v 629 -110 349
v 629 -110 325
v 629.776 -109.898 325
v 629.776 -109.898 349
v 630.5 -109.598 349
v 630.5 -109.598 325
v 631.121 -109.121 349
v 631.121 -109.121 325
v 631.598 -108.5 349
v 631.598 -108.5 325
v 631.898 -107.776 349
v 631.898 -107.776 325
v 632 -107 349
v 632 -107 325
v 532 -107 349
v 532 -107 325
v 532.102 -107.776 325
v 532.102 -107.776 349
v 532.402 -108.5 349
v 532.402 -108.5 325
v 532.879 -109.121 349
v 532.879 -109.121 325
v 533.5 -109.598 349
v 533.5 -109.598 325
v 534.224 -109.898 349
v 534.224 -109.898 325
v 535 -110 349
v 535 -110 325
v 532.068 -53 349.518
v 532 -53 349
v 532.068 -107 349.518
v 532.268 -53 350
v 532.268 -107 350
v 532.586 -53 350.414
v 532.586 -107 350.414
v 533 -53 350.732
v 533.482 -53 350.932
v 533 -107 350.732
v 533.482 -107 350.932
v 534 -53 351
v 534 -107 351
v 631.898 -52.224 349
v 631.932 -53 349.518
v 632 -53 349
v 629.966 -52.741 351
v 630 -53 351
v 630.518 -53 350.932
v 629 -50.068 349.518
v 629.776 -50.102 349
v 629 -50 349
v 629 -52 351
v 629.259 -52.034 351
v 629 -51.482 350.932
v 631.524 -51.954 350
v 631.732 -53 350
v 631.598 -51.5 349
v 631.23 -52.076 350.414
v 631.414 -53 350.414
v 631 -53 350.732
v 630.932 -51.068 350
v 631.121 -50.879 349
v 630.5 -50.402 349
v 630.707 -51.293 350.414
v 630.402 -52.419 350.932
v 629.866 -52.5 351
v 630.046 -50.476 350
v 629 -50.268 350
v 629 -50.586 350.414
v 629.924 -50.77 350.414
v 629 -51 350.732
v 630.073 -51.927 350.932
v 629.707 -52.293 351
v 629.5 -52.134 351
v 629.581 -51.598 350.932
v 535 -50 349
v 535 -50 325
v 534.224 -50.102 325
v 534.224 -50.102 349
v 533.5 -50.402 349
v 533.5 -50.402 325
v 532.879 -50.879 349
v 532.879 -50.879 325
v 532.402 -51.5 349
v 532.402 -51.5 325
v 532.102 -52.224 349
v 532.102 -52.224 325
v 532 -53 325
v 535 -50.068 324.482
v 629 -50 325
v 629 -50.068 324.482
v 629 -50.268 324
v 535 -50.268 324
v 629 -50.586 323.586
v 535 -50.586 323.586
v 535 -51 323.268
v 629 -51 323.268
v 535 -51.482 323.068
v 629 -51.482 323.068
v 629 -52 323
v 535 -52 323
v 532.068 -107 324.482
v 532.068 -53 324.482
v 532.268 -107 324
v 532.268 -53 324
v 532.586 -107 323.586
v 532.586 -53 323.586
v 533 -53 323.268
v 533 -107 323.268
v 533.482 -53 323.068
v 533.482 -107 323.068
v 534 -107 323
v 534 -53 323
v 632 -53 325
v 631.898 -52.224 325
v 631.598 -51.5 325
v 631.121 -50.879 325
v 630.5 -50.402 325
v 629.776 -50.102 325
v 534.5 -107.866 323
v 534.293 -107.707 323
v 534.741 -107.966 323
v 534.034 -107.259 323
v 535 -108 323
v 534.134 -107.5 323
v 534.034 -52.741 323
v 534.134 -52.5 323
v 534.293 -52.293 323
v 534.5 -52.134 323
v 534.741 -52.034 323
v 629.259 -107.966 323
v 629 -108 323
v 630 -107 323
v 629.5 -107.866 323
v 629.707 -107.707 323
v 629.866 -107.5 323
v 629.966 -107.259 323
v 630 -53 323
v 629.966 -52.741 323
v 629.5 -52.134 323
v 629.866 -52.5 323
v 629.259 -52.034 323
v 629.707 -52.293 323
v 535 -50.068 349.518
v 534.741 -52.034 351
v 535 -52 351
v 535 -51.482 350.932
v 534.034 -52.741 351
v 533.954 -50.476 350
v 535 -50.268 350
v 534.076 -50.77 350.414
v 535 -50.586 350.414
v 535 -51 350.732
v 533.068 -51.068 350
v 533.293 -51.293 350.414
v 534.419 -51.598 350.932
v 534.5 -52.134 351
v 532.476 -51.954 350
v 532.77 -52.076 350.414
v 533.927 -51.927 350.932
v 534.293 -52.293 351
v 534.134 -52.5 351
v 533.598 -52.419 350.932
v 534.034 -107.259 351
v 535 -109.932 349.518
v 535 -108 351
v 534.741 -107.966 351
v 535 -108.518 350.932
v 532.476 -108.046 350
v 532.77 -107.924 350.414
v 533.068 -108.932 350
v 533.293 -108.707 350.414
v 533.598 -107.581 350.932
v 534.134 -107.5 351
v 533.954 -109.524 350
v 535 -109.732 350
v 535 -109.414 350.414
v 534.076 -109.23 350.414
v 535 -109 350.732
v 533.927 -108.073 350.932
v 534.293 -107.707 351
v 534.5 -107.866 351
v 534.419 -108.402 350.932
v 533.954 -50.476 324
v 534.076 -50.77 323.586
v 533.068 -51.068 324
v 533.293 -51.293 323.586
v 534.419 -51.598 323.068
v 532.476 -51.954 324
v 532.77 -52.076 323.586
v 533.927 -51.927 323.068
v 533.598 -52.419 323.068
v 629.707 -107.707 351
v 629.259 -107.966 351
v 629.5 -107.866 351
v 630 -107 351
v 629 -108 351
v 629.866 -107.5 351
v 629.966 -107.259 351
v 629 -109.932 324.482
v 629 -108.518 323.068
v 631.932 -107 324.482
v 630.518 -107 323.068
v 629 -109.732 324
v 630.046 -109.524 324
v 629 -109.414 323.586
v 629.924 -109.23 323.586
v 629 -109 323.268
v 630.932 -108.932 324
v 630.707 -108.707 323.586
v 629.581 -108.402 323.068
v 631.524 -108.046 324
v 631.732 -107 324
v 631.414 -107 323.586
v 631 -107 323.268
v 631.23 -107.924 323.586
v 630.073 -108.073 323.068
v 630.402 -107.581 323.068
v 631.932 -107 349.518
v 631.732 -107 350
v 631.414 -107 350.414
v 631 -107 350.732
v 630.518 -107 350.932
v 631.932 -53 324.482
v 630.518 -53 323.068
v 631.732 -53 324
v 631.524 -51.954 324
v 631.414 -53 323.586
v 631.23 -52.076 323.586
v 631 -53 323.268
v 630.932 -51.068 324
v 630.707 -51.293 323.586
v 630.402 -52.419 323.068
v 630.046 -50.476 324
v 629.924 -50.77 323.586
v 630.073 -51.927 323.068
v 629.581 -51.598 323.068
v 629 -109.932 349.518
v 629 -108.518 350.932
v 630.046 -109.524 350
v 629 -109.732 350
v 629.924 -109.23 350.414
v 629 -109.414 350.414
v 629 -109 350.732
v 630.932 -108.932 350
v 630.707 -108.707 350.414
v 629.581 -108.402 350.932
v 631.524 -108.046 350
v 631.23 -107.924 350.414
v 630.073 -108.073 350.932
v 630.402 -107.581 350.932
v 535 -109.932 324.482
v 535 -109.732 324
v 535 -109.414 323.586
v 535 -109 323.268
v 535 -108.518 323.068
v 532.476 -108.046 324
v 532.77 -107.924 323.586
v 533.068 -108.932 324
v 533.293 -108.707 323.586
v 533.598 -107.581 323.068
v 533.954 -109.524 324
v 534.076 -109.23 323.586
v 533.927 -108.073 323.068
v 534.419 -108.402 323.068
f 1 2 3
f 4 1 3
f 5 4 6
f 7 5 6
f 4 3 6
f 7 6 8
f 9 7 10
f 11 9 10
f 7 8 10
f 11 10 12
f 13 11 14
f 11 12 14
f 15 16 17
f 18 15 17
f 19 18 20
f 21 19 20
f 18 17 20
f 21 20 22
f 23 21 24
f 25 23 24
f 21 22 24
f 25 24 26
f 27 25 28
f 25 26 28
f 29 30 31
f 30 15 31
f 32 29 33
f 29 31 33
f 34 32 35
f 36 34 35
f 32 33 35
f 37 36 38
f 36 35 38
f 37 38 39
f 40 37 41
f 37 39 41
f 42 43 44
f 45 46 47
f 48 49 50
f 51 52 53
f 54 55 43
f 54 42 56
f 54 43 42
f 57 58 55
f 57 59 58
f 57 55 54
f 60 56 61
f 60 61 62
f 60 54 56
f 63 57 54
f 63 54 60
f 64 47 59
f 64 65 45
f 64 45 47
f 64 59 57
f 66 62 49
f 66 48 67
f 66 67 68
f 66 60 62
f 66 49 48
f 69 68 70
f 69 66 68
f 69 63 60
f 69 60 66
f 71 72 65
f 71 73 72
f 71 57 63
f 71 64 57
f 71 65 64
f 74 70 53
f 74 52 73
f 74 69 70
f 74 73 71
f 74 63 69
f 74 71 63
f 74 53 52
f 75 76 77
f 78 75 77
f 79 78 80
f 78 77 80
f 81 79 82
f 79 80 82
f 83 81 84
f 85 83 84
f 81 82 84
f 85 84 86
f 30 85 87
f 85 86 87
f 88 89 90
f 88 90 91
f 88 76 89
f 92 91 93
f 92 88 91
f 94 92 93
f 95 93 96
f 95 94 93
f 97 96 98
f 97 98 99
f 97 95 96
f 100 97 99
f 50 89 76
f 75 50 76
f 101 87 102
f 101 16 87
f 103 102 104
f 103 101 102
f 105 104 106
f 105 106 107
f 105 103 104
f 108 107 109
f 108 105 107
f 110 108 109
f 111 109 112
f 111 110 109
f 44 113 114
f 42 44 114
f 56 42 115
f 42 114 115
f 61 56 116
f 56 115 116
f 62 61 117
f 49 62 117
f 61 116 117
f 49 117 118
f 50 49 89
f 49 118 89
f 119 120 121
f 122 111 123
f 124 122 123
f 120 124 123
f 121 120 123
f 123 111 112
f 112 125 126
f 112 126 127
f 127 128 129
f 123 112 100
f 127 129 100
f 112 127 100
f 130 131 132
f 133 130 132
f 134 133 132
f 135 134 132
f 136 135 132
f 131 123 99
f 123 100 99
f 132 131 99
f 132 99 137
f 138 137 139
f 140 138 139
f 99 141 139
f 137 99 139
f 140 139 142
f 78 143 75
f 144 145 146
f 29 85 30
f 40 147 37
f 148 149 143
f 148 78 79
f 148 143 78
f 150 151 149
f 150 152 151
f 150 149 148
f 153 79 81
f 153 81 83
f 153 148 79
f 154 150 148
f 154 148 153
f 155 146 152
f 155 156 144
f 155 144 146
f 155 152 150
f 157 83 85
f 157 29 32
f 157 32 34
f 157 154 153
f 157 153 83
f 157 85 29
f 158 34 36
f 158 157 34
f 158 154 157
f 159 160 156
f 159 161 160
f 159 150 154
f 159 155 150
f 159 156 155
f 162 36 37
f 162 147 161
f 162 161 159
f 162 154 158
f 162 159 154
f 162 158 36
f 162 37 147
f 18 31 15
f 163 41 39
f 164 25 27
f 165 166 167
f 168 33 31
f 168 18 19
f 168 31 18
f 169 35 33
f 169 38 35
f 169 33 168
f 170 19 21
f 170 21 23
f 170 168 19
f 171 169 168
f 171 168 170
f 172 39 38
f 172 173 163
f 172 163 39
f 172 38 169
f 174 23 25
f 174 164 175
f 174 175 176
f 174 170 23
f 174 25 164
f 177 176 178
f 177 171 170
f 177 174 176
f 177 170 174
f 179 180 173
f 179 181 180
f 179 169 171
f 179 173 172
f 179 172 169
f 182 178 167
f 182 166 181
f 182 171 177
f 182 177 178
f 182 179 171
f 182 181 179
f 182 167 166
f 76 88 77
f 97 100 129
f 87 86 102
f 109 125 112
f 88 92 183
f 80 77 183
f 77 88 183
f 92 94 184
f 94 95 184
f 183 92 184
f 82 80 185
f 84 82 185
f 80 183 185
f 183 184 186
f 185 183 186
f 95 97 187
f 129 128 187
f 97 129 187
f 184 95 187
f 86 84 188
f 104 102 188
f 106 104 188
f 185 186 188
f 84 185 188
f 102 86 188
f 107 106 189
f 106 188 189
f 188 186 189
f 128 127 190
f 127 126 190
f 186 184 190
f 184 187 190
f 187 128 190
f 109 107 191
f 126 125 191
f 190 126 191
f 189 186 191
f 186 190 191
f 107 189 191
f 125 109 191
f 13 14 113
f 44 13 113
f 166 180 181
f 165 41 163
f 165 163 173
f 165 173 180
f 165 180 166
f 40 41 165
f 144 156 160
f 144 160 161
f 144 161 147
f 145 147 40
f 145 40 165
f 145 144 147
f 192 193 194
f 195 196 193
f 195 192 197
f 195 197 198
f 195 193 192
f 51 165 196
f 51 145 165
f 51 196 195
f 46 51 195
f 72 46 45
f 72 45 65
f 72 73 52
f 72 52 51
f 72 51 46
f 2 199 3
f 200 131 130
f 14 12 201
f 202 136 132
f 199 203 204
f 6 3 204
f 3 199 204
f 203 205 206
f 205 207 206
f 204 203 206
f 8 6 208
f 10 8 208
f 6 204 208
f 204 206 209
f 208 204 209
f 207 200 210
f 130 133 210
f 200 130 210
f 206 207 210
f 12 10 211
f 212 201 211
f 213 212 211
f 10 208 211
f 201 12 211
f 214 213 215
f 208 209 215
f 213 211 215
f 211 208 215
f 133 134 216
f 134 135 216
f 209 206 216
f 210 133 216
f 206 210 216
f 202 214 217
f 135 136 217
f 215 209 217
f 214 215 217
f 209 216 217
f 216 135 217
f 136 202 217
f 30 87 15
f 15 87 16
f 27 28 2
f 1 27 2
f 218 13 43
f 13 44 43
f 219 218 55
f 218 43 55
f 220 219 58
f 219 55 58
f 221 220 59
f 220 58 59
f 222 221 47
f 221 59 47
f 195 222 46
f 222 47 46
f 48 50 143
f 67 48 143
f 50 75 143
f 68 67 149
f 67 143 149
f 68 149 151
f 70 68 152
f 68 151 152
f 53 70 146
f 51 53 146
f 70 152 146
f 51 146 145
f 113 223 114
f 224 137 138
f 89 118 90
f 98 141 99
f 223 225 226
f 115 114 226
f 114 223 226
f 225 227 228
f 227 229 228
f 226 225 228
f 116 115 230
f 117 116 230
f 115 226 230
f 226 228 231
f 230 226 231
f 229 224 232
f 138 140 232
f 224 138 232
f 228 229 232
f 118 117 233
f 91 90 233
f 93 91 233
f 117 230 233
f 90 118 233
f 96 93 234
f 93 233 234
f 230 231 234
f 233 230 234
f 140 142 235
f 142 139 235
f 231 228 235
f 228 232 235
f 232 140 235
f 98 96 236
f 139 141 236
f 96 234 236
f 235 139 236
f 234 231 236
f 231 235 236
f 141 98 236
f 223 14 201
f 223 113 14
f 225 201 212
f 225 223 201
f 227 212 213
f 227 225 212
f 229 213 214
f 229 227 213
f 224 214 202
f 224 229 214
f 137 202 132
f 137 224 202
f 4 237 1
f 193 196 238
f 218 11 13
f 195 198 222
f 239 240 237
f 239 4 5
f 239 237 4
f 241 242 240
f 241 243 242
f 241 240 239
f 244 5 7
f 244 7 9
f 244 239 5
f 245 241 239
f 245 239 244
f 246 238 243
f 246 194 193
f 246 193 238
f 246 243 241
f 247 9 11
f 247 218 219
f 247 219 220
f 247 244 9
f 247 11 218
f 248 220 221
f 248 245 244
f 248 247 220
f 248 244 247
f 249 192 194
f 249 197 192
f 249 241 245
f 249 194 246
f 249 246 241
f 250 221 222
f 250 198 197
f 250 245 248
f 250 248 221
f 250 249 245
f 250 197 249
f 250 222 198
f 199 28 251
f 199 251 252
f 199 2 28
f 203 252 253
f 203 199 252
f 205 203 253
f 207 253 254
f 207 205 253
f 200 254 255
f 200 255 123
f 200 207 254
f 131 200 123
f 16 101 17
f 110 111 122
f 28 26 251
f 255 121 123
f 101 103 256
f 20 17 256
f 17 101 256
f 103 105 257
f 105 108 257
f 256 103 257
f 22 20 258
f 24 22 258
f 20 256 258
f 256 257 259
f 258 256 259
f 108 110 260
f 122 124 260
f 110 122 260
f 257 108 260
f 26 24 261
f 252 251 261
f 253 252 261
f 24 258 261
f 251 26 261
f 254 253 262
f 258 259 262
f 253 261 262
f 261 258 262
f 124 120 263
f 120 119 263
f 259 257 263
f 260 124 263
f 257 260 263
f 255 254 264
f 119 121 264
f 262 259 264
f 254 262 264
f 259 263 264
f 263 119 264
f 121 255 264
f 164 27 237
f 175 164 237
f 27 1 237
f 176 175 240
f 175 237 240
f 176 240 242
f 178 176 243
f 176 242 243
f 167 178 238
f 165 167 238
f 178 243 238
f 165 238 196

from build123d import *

# Parameters (mm, degrees)
BLOCK_START           = 323
BLOCK_1_DEPTH         = 28
BLOCK_EDGE_FILLET_1_R = 2


with BuildPart() as part:
    # Block sketch 1 → Block 1 (new body)
    with BuildSketch(Plane.XY.offset(BLOCK_START)):
        with BuildLine():
            Line((535, -110), (629, -110))
            ThreePointArc((629, -110), (631.121320344, -109.121320344), (632, -107))
            Line((632, -107), (632, -53))
            ThreePointArc((632, -53), (631.121320344, -50.878679656), (629, -50))
            Line((629, -50), (535, -50))
            ThreePointArc((535, -50), (532.878679656, -50.878679656), (532, -53))
            Line((532, -53), (532, -107))
            ThreePointArc((532, -107), (532.878679656, -109.121320344), (535, -110))
        make_face()
    extrude(amount=BLOCK_1_DEPTH)

    # Block edge fillet 1
    block_edge_fillet_1_edges = [part.edges().sort_by_distance(p)[0] for p in [
        (632, -80, 323),
        (631.121320344, -109.121320344, 323),
        (582, -110, 323),
        (532.878679656, -109.121320344, 323),
        (631.121320344, -109.121320344, 351),
        (632, -80, 351),
        (631.121320344, -50.878679656, 351),
        (582, -50, 351),
        (532.878679656, -50.878679656, 351),
        (532, -80, 351),
        (532.878679656, -109.121320344, 351),
        (532, -80, 323),
        (582, -110, 351),
        (532.878679656, -50.878679656, 323),
        (582, -50, 323),
        (631.121320344, -50.878679656, 323),
    ]]
    fillet(block_edge_fillet_1_edges, radius=BLOCK_EDGE_FILLET_1_R)


solid = part.part
